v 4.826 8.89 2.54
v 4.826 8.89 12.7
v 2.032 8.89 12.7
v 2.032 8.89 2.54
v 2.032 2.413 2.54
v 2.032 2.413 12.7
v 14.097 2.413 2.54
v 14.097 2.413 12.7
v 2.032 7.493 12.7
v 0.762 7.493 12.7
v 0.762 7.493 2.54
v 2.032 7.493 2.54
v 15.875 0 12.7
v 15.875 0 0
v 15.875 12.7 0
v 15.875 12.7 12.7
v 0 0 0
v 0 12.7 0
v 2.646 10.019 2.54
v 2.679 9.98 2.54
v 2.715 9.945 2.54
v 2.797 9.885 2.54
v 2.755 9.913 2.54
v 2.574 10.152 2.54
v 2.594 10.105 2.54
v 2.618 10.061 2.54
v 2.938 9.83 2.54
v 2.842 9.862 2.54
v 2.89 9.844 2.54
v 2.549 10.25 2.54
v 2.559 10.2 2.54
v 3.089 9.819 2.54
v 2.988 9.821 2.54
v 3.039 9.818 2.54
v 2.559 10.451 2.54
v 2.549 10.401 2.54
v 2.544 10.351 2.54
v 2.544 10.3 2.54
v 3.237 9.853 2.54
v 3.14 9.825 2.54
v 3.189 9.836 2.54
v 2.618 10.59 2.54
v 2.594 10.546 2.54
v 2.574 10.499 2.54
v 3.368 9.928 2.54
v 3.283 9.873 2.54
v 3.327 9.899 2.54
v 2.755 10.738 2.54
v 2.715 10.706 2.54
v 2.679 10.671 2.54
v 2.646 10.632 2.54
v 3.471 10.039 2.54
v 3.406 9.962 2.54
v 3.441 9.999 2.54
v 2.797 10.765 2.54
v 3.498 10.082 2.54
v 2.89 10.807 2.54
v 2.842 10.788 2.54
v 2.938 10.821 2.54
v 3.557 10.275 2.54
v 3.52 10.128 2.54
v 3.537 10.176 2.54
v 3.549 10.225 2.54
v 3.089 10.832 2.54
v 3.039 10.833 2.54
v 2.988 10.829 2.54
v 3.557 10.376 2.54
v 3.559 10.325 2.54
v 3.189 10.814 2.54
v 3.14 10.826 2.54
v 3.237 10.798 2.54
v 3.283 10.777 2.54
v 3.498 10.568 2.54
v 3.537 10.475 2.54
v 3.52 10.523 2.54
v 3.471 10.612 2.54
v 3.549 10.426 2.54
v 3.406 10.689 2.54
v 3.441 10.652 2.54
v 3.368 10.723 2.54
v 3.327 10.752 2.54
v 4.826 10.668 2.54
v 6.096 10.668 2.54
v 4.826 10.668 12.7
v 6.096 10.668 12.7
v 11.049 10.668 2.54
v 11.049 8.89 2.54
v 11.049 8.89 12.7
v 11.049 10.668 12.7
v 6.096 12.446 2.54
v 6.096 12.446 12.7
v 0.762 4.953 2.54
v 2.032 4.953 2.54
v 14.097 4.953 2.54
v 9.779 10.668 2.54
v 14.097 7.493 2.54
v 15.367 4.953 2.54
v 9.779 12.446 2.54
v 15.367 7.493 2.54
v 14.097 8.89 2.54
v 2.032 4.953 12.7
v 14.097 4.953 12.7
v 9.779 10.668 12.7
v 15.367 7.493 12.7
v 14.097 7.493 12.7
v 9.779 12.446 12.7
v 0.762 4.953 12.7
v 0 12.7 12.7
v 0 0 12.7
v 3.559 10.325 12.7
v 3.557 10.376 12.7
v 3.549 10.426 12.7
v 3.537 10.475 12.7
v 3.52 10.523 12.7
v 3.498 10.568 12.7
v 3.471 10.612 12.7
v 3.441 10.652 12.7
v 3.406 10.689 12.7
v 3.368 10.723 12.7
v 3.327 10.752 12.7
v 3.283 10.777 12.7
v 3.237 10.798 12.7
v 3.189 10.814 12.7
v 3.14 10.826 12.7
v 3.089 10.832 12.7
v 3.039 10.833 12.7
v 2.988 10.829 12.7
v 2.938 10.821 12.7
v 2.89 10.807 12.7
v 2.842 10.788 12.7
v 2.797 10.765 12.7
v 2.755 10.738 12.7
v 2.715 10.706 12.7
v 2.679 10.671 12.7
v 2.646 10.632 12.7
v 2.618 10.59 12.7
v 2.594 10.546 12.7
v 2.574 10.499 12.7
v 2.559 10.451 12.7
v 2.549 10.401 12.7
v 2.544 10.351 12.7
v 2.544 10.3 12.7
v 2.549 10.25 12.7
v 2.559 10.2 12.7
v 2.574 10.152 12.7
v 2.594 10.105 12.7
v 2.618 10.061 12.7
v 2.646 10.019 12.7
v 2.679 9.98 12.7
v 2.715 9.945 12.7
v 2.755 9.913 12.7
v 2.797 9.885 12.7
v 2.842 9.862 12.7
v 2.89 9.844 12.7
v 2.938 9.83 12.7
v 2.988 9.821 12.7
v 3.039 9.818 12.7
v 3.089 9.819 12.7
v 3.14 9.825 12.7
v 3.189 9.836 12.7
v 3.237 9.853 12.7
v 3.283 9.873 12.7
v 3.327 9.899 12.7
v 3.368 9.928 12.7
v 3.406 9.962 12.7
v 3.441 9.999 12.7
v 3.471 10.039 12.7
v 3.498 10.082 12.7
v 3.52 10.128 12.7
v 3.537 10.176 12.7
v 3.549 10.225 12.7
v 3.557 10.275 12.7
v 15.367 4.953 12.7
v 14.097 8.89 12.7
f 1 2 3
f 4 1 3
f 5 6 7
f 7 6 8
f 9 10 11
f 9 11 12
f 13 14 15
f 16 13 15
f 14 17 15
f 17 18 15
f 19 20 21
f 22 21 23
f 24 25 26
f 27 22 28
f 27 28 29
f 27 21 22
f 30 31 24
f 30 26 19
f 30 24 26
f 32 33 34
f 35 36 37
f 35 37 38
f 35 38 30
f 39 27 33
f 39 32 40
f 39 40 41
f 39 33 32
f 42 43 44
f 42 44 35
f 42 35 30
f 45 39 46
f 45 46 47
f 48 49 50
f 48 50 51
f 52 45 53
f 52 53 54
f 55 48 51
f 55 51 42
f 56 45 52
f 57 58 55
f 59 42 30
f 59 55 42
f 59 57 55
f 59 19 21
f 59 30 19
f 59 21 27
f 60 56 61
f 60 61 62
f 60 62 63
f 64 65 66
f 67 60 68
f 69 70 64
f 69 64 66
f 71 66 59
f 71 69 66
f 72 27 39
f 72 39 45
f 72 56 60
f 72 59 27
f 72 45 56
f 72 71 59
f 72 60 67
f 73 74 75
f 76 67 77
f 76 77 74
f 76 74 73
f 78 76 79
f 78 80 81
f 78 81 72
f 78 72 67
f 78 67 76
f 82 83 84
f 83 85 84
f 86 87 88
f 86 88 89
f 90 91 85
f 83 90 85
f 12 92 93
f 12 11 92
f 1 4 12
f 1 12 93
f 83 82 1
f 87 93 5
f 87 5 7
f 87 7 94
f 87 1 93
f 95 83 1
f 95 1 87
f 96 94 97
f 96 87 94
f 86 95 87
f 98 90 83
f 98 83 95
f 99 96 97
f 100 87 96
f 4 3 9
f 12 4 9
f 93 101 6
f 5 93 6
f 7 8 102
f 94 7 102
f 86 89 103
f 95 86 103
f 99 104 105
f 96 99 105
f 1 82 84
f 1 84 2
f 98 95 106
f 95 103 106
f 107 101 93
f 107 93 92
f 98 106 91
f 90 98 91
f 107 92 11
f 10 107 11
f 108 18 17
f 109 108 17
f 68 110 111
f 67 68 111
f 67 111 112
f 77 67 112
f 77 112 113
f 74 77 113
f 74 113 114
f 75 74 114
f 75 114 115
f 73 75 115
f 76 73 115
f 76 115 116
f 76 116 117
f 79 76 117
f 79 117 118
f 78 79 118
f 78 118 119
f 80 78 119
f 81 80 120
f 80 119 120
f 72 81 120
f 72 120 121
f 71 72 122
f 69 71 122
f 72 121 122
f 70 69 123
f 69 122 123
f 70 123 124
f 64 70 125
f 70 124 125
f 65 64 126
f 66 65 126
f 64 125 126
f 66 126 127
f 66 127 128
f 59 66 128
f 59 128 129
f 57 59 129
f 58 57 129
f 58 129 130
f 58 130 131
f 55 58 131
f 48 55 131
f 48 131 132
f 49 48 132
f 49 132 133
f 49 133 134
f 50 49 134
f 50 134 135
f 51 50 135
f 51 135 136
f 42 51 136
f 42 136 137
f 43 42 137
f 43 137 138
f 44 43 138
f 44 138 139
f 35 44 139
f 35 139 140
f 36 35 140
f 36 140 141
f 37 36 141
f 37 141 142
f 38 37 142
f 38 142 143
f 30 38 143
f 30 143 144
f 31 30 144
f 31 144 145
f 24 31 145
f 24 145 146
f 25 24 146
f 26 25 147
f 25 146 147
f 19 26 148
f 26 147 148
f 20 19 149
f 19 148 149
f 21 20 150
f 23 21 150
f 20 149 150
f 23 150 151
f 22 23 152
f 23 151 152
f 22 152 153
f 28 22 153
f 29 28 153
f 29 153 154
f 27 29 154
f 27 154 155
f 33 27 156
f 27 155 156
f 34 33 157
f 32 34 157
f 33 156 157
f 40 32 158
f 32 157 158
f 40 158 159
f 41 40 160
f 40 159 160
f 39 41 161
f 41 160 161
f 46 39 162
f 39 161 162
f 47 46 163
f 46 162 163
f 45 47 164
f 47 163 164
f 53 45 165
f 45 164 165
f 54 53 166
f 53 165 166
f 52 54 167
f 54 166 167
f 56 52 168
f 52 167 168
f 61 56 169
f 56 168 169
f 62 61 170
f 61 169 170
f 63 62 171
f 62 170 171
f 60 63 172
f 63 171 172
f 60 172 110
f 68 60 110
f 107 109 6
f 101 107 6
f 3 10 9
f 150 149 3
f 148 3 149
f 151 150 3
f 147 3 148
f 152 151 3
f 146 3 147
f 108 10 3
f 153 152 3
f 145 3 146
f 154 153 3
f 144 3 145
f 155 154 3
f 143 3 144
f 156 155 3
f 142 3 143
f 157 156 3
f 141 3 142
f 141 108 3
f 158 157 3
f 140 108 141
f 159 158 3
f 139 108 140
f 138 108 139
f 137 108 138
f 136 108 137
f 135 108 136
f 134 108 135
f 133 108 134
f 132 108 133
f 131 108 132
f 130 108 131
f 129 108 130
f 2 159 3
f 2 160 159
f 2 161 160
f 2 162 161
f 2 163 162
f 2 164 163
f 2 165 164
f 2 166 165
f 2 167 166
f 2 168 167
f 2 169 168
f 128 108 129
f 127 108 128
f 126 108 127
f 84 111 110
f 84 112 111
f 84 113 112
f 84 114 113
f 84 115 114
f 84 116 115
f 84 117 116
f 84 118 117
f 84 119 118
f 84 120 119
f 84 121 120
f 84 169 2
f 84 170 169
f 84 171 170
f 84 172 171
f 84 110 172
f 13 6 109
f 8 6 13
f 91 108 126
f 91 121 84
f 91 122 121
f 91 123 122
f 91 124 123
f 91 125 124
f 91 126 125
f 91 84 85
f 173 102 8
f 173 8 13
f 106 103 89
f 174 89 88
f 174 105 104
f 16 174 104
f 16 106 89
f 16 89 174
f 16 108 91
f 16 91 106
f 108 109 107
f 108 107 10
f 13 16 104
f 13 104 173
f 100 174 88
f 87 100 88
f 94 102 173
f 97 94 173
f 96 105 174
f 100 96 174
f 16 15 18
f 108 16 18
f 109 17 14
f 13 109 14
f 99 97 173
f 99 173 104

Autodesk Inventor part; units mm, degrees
ref_plane "YZ Plane" through (0, 0, 0) normal (1, 0, 0) x (0, 1, 0)
ref_plane "XZ Plane" through (0, 0, 0) normal (0, 1, 0) x (-1, 0, 0)
ref_plane "XY Plane" through (0, 0, 0) normal (0, 0, 1) x (1, 0, 0)
sketch "Sketch1" plane through (0, 0, 0) normal (0, 0, 1) x (1, 0, 0)
  point P0 (0, 0)
sketch "Sketch2" plane through (0, 0, 0) normal (0, 0, 1) x (1, 0, 0)
  line L0 (0, 0) -> (15.875, 0)
  line L1 (15.875, 0) -> (15.875, 12.7)
  line L2 (15.875, 12.7) -> (0, 12.7)
  line L3 (0, 12.7) -> (0, 0)
  dimension "d0" = 15.875
  dimension "d1" = 12.7
extrude "Extrusion1" add sketch "Sketch2" along normal blind 12.7
sketch "Sketch3" plane through (0, 0, 12.7) normal (0, 0, 1) x (1, 0, 0)
  line L0 (0, 12.7) -> (0, 0) projected
  line L1 (0, 0) -> (2.032, 0)
  line L2 (0, 0) -> (15.875, 0) projected
  line L3 (2.032, 2.413) -> (14.097, 2.413)
  line L4 (14.097, 2.413) -> (14.097, 8.89)
  line L5 (14.097, 8.89) -> (2.032, 8.89)
  line L6 (2.032, 8.89) -> (2.032, 2.413)
extrude "Extrusion2" cut sketch "Sketch3" against normal blind 10.16
sketch "Sketch4" plane through (0, 0, 12.7) normal (0, 0, 1) x (1, 0, 0)
  line L0 (2.032, 8.89) -> (14.097, 8.89) projected
  line L1 (11.049, 8.89) -> (11.049, 10.668)
  line L2 (11.049, 10.668) -> (4.826, 10.668)
  line L3 (4.826, 10.668) -> (4.826, 8.89)
  line L4 (11.049, 8.89) -> (4.826, 8.89)
  point P0 (0, 0)
  dimension "d13" = 3.048
  dimension "d16" = 6.223
extrude "Extrusion3" cut sketch "Sketch4" against normal blind 10.16
sketch "Sketch5" plane through (0, 0, 12.7) normal (0, 0, 1) x (1, 0, 0)
  line L0 (11.049, 10.668) -> (11.049, 8.89) projected
  line L1 (4.826, 10.668) -> (11.049, 10.668) projected
  line L2 (9.779, 10.668) -> (9.779, 12.446)
  line L3 (9.779, 12.446) -> (6.096, 12.446)
  line L4 (6.096, 12.446) -> (6.096, 10.668)
  line L5 (6.096, 10.668) -> (9.779, 10.668)
  point P0 (0, 0)
extrude "Extrusion4" cut sketch "Sketch5" against normal blind 10.16
sketch "Sketch6" plane through (0, 0, 12.7) normal (0, 0, 1) x (1, 0, 0)
  line L0 (14.097, 2.413) -> (2.032, 2.413) projected
  line L1 (14.097, 8.89) -> (14.097, 2.413) projected
  line L2 (14.097, 4.953) -> (15.367, 4.953)
  line L3 (15.367, 4.953) -> (15.367, 7.493)
  line L4 (15.367, 7.493) -> (14.097, 7.493)
  line L5 (14.097, 7.493) -> (14.097, 4.953)
  line L6 (2.032, 2.413) -> (2.032, 8.89) projected
  line L7 (2.032, 4.953) -> (0.762, 4.953)
  line L8 (0.762, 4.953) -> (0.762, 7.493)
  line L9 (0.762, 7.493) -> (2.032, 7.493)
  line L10 (2.032, 7.493) -> (2.032, 4.953)
  point P0 (0, 0)
extrude "Extrusion5" cut sketch "Sketch6" against normal blind 10.16
sketch "Sketch7" plane through (0, 0, 12.7) normal (0, 0, 1) x (1, 0, 0)
  circle A0 centre (3.0514, 10.3254) radius 0.508
  point P0 (0, 0)
  dimension "d33" = 1.016
extrude "Extrusion6" cut sketch "Sketch7" against normal blind 10.16
properties part number "Ethernet Port" material "Acetal Resin, White"
